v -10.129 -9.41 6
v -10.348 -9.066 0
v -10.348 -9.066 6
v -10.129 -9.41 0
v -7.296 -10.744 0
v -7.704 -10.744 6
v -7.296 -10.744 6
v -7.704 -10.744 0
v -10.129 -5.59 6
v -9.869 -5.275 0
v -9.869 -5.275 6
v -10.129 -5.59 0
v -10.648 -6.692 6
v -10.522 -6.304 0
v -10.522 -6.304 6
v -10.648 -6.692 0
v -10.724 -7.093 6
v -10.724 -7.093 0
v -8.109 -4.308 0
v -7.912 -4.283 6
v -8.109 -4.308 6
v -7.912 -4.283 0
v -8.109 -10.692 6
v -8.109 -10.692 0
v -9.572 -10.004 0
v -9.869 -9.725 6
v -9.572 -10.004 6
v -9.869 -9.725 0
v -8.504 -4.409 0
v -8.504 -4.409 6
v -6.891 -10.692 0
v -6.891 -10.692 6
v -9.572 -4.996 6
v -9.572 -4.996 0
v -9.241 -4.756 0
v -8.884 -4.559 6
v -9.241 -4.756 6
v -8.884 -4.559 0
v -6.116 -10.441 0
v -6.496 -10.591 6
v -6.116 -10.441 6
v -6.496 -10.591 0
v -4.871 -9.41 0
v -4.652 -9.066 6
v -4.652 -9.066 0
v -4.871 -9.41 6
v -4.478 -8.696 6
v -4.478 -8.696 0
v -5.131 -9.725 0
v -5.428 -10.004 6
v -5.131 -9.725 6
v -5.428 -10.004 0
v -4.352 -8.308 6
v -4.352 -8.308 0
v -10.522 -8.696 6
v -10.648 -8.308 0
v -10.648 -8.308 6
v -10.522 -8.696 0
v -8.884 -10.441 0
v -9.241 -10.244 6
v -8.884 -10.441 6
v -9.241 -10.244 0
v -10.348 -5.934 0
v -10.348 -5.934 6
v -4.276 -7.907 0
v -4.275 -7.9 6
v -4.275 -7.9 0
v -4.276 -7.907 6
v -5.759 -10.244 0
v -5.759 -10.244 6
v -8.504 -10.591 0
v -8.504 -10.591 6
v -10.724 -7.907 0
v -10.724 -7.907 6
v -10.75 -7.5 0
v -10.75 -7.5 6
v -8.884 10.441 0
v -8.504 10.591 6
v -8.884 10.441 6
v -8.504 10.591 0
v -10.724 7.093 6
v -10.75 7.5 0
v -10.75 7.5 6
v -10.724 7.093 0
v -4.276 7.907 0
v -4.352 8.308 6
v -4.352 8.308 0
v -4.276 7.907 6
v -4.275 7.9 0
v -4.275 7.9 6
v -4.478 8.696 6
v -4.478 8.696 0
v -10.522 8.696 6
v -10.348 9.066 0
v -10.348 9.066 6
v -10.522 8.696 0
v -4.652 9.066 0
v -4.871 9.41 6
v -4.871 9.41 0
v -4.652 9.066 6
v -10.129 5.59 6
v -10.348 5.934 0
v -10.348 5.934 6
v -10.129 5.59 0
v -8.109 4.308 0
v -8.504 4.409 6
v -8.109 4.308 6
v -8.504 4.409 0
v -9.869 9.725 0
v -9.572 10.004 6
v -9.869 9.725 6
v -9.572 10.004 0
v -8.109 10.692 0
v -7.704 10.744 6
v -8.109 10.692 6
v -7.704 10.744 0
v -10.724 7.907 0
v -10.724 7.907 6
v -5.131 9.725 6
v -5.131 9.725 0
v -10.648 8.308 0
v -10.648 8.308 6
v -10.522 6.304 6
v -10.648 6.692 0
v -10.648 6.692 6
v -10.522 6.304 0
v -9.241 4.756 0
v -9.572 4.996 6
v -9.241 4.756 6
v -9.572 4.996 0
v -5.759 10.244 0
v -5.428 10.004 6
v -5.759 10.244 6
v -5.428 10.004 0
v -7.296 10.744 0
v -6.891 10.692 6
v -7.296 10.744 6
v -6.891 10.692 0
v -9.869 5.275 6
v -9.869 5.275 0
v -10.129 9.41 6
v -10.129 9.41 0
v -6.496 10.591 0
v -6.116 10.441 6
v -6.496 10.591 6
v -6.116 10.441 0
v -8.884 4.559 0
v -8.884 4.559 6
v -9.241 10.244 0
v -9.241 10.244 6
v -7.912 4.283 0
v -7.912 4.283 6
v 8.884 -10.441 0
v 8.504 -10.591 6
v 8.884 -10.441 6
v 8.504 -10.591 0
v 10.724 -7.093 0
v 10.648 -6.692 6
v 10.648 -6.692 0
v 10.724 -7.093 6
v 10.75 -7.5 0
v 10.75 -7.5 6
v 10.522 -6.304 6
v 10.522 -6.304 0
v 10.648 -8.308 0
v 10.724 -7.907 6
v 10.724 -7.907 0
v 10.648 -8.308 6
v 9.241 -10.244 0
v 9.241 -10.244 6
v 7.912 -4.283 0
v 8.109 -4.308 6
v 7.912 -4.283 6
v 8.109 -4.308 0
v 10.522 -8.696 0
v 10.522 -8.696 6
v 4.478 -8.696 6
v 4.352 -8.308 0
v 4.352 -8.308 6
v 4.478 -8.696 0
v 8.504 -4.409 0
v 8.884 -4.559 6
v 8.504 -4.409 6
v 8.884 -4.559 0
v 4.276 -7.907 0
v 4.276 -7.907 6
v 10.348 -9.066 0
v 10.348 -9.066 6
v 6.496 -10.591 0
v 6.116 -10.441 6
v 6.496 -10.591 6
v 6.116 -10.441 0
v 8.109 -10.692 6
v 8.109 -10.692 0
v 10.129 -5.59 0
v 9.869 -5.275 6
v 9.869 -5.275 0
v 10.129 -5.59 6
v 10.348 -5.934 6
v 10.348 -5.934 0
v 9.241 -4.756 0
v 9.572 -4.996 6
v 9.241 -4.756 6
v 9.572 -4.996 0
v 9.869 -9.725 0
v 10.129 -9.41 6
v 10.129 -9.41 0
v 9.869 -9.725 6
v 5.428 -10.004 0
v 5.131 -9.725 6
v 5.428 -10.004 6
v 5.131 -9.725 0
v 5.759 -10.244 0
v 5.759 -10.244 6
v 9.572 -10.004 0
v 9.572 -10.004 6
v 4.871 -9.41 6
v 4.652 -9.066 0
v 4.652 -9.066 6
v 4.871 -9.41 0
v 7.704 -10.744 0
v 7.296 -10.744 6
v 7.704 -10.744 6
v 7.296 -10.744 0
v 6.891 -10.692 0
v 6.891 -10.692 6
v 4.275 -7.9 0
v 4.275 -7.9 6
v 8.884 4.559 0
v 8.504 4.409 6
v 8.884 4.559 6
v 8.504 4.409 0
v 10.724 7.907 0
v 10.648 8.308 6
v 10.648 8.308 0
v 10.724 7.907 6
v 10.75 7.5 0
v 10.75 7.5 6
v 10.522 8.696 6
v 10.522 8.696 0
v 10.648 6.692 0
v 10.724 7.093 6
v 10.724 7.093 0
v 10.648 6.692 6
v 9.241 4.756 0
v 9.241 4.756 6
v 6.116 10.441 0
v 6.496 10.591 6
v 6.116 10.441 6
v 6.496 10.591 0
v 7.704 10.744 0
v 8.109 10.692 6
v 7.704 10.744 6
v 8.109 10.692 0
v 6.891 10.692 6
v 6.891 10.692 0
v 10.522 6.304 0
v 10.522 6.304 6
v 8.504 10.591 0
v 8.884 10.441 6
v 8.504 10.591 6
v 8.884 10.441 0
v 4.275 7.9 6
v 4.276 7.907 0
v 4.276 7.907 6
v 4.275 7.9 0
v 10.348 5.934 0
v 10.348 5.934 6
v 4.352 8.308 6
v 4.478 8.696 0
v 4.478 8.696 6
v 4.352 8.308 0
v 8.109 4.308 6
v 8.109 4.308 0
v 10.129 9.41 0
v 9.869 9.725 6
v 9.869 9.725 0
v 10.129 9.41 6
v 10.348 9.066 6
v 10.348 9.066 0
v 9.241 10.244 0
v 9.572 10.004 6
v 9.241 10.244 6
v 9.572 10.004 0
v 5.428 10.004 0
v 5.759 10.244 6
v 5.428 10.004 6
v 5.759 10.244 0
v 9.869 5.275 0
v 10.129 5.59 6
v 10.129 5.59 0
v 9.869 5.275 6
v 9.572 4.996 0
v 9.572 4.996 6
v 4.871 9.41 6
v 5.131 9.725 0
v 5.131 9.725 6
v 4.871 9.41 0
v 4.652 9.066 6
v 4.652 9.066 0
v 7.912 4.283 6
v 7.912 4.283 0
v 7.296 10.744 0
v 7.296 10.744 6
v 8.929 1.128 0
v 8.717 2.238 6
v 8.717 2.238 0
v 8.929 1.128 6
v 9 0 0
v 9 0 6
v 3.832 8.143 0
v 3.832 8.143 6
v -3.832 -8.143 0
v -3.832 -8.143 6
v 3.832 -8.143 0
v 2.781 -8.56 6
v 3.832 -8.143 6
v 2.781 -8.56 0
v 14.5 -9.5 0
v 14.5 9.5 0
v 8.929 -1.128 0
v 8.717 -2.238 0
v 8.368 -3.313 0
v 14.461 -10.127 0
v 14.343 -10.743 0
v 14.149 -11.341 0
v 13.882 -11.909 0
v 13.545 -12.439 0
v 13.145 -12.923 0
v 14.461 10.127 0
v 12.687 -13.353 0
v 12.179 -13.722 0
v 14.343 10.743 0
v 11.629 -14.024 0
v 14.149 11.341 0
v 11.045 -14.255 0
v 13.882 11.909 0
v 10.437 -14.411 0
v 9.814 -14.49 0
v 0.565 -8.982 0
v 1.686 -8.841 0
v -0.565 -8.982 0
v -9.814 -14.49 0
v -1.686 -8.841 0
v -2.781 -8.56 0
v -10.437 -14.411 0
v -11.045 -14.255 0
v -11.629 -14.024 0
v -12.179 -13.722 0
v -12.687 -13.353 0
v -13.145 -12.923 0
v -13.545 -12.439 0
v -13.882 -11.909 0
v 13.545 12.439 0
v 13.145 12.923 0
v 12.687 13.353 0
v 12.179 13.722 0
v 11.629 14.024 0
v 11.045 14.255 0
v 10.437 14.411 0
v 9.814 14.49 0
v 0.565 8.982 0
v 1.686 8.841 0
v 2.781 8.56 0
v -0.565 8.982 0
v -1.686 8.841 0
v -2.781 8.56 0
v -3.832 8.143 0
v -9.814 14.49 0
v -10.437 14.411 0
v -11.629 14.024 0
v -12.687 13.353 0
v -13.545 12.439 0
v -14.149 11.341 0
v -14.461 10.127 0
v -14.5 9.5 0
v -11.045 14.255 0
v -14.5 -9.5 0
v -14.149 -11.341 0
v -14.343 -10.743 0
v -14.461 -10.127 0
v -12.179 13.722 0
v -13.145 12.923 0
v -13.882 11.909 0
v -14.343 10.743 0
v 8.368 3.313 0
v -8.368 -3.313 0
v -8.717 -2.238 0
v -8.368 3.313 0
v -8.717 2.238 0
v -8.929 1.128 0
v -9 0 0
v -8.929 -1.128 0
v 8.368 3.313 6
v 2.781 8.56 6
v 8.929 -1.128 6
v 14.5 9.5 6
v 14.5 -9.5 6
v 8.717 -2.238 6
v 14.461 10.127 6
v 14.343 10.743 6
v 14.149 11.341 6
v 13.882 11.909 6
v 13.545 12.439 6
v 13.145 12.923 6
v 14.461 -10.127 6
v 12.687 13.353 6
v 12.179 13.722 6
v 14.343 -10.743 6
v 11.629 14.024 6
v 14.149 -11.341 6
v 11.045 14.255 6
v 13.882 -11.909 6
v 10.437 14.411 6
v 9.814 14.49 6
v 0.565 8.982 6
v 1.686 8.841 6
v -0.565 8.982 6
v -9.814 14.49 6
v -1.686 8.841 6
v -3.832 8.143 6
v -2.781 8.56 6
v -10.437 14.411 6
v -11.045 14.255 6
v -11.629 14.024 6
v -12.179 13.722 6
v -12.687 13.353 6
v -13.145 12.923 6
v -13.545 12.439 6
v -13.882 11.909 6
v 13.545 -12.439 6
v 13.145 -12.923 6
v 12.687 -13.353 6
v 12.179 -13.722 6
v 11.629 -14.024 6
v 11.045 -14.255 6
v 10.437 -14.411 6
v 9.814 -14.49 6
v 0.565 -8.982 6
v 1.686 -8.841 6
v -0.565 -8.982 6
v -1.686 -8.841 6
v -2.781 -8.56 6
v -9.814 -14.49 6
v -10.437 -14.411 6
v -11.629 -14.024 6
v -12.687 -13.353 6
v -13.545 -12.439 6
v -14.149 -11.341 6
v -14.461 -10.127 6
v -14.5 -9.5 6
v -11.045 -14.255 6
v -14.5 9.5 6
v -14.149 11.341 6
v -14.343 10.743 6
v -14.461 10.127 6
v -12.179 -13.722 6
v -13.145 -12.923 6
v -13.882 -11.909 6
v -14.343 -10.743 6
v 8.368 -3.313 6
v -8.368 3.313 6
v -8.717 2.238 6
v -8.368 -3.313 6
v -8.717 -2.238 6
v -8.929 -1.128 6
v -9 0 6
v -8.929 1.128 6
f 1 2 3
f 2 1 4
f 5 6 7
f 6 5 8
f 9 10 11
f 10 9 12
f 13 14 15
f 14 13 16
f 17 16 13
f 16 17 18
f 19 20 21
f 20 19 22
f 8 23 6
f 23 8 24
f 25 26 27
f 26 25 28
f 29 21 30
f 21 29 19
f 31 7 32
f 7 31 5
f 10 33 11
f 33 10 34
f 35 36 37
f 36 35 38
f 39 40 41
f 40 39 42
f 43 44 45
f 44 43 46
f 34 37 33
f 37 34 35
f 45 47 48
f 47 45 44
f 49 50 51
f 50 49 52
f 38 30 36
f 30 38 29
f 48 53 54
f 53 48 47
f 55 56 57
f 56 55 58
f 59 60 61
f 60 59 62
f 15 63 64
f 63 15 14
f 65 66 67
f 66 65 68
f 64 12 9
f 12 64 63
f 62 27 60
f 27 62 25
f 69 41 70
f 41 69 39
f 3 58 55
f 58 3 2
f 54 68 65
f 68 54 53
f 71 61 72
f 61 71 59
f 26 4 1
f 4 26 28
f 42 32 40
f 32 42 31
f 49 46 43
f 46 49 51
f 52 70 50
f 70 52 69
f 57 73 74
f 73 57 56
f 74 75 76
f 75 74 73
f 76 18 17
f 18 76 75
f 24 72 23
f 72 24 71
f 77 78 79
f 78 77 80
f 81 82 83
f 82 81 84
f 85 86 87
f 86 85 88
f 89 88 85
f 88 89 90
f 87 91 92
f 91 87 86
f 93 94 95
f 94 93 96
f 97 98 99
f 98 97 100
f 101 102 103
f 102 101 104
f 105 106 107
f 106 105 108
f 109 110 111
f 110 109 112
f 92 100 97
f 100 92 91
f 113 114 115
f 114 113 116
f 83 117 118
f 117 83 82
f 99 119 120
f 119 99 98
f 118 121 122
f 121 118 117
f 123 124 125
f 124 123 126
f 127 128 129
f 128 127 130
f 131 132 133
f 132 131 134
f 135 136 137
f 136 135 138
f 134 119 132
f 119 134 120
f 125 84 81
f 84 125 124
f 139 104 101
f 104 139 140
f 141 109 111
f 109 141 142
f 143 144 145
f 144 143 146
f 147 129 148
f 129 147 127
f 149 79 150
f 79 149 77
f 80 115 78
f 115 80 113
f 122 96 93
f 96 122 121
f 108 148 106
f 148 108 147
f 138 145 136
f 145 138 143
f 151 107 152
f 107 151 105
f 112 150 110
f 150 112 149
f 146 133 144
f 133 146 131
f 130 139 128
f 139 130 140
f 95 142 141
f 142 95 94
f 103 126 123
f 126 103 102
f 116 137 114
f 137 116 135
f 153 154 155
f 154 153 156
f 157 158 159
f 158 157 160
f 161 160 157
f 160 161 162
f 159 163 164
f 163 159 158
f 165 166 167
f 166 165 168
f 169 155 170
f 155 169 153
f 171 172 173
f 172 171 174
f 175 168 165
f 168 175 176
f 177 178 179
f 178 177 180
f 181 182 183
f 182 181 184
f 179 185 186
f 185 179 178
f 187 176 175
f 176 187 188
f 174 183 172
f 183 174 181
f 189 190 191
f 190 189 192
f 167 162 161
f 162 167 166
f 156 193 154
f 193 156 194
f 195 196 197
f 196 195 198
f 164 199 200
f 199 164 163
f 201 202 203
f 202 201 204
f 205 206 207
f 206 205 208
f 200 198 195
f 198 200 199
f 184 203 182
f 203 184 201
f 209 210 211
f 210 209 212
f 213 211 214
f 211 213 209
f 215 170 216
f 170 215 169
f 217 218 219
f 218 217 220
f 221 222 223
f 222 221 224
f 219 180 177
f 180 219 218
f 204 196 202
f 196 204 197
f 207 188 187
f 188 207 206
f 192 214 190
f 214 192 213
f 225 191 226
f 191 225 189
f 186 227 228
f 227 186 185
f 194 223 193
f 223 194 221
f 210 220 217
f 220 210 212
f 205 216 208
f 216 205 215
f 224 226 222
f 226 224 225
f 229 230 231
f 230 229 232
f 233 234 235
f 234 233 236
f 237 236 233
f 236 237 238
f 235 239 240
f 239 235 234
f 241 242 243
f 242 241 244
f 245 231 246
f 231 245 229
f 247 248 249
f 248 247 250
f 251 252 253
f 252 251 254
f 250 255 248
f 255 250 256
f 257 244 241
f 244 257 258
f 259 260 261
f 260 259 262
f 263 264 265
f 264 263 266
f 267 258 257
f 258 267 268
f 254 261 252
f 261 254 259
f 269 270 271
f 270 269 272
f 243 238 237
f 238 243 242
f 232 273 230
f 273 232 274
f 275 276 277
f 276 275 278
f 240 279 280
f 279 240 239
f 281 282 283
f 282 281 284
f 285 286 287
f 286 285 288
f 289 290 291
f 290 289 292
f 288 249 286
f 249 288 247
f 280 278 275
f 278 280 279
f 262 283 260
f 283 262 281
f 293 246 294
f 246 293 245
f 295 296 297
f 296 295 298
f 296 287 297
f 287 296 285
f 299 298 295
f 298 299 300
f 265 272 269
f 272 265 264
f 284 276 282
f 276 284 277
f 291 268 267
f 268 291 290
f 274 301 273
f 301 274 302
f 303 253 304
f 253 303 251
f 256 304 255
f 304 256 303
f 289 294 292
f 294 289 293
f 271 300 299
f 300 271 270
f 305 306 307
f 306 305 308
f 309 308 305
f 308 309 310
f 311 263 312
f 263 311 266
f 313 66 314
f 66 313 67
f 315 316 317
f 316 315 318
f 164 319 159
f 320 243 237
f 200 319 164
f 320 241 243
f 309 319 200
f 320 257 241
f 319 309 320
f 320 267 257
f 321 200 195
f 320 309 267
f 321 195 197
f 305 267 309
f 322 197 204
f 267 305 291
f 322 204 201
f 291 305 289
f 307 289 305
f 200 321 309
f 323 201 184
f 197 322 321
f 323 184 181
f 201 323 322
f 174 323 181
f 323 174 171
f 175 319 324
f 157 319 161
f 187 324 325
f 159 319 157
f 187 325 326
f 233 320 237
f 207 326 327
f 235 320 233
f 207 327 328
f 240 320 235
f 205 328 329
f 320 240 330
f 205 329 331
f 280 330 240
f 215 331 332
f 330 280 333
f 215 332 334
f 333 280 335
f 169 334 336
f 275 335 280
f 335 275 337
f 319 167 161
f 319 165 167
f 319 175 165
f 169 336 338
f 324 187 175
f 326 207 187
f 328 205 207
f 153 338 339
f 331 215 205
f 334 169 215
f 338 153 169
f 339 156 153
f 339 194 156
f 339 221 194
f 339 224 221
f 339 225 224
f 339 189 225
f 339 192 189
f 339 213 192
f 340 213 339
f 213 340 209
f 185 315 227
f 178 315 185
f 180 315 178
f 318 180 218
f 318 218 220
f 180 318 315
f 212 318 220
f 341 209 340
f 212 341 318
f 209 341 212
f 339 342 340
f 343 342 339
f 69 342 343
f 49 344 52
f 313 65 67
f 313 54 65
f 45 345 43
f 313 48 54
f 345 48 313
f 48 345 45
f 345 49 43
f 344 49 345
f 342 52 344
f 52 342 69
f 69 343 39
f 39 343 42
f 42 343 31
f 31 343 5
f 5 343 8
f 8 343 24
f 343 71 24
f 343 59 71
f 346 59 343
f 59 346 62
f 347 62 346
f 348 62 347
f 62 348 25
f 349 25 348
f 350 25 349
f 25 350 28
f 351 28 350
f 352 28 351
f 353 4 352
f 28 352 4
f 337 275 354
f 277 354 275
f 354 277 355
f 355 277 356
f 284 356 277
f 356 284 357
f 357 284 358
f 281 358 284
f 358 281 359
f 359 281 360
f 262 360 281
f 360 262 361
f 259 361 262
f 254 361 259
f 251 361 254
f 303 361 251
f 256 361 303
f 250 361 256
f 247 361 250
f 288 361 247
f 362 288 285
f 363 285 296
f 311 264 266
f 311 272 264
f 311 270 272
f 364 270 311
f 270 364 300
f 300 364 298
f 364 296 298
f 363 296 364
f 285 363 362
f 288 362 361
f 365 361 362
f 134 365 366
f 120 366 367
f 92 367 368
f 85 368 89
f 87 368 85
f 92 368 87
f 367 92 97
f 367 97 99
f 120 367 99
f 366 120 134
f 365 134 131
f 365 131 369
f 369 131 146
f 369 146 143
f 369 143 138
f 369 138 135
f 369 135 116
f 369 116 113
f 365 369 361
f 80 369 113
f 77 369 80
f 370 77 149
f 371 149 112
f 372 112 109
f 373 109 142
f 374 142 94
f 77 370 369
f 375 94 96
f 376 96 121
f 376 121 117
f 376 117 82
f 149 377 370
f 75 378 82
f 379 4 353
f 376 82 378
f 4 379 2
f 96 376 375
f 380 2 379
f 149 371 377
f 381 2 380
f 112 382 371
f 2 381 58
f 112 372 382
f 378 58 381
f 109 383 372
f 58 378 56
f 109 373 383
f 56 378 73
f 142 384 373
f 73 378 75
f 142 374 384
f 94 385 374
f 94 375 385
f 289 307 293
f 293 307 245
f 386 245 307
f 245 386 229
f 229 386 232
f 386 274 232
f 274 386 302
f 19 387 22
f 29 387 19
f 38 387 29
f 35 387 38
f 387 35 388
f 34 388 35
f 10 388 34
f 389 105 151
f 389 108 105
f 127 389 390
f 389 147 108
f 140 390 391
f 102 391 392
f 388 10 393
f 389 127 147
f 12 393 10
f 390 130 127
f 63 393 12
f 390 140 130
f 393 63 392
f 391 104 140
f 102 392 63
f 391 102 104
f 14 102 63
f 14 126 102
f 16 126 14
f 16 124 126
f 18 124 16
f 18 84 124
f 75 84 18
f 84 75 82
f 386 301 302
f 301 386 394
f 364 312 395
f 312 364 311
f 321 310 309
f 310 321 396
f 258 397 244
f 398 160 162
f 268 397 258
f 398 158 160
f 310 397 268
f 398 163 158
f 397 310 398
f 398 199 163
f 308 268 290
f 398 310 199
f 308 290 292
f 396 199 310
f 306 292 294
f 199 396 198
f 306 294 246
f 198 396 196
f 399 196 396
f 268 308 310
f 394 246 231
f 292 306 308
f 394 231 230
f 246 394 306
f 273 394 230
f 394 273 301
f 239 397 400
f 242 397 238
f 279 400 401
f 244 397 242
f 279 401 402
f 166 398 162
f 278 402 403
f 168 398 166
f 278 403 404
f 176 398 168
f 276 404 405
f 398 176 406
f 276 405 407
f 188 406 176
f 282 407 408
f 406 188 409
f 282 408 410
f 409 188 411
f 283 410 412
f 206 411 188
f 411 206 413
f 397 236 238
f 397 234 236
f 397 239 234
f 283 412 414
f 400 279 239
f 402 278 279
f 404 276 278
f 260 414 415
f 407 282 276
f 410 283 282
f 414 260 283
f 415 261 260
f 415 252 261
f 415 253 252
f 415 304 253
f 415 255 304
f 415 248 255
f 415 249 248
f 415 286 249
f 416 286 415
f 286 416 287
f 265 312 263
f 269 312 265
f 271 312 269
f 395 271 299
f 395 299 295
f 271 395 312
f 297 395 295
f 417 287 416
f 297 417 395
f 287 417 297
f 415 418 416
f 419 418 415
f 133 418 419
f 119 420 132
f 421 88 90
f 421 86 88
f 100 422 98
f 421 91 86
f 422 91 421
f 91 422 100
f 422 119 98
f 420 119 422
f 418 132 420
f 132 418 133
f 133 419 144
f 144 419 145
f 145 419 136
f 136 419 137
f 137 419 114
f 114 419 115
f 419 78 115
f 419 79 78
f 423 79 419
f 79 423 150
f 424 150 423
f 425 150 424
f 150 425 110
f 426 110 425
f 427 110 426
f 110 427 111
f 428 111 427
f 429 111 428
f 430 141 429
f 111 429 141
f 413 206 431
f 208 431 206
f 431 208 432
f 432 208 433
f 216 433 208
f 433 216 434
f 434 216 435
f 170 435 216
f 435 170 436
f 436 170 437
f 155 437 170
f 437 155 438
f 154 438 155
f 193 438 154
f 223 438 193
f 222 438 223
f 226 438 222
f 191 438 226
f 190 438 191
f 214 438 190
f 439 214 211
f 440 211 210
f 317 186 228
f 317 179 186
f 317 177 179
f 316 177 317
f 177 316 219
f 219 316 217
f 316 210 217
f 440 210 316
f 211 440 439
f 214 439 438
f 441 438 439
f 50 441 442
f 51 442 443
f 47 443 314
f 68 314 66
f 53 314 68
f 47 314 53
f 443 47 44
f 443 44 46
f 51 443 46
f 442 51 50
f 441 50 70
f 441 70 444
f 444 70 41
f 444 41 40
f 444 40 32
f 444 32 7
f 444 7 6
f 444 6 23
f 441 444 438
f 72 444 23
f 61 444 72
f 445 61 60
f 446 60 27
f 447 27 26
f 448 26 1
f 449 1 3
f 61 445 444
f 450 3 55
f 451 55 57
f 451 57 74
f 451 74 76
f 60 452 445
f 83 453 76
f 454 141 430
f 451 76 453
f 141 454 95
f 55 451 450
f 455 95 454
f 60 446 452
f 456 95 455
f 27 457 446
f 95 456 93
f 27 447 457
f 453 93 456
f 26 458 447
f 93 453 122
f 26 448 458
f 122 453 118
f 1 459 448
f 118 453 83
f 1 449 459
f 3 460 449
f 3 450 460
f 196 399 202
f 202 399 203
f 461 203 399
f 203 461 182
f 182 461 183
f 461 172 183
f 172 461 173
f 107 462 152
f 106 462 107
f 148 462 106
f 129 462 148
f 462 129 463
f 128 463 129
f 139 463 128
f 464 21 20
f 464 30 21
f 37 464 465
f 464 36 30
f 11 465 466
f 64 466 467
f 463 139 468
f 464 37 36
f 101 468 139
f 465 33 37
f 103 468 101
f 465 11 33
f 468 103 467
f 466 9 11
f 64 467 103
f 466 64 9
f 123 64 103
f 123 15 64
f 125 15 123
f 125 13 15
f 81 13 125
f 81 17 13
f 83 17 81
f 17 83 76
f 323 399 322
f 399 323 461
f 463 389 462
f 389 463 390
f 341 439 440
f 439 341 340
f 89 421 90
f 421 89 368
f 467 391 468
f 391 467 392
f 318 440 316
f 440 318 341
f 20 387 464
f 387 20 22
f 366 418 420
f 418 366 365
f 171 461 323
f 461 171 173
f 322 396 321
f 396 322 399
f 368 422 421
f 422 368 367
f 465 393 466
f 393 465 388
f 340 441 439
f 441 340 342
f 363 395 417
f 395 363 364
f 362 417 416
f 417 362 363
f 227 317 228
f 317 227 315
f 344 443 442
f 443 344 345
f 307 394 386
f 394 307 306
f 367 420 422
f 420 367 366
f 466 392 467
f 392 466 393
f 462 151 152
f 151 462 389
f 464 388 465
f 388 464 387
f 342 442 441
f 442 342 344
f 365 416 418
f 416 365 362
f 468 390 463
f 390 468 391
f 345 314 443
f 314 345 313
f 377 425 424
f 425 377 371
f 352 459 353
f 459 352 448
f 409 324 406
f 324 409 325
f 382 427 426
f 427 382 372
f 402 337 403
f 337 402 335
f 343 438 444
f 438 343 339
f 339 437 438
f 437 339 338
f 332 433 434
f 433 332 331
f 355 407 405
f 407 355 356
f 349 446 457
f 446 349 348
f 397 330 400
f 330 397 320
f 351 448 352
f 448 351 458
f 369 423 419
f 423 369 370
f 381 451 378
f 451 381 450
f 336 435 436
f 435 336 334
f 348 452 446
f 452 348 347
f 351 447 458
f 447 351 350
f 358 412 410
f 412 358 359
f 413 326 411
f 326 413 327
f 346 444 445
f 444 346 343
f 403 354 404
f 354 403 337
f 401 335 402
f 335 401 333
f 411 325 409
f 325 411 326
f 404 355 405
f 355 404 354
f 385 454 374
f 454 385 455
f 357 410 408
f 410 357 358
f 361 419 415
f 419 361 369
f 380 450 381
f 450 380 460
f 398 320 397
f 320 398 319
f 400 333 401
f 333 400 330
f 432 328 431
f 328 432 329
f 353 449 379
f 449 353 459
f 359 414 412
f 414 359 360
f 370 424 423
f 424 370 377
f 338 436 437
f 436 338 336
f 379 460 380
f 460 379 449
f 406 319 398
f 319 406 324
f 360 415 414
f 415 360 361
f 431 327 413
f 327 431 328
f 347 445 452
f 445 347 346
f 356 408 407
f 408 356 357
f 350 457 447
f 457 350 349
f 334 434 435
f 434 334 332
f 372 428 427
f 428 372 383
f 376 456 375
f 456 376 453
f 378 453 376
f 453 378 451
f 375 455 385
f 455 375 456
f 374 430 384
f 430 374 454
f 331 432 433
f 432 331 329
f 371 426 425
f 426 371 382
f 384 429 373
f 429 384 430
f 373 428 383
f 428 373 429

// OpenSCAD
$fn = 50;


difference() {
	union() {
		hull() {
			translate(v = [-9.5000000000, 9.5000000000, 0]) {
				cylinder(h = 6, r = 5);
			}
			translate(v = [9.5000000000, 9.5000000000, 0]) {
				cylinder(h = 6, r = 5);
			}
			translate(v = [-9.5000000000, -9.5000000000, 0]) {
				cylinder(h = 6, r = 5);
			}
			translate(v = [9.5000000000, -9.5000000000, 0]) {
				cylinder(h = 6, r = 5);
			}
		}
	}
	union() {
		#translate(v = [-7.5000000000, -7.5000000000, -100.0000000000]) {
			cylinder(h = 200, r = 3.2500000000);
		}
		#translate(v = [-7.5000000000, 7.5000000000, -100.0000000000]) {
			cylinder(h = 200, r = 3.2500000000);
		}
		#translate(v = [7.5000000000, -7.5000000000, -100.0000000000]) {
			cylinder(h = 200, r = 3.2500000000);
		}
		#translate(v = [7.5000000000, 7.5000000000, -100.0000000000]) {
			cylinder(h = 200, r = 3.2500000000);
		}
		#cylinder(h = 6, r = 9.0000000000);
	}
}
